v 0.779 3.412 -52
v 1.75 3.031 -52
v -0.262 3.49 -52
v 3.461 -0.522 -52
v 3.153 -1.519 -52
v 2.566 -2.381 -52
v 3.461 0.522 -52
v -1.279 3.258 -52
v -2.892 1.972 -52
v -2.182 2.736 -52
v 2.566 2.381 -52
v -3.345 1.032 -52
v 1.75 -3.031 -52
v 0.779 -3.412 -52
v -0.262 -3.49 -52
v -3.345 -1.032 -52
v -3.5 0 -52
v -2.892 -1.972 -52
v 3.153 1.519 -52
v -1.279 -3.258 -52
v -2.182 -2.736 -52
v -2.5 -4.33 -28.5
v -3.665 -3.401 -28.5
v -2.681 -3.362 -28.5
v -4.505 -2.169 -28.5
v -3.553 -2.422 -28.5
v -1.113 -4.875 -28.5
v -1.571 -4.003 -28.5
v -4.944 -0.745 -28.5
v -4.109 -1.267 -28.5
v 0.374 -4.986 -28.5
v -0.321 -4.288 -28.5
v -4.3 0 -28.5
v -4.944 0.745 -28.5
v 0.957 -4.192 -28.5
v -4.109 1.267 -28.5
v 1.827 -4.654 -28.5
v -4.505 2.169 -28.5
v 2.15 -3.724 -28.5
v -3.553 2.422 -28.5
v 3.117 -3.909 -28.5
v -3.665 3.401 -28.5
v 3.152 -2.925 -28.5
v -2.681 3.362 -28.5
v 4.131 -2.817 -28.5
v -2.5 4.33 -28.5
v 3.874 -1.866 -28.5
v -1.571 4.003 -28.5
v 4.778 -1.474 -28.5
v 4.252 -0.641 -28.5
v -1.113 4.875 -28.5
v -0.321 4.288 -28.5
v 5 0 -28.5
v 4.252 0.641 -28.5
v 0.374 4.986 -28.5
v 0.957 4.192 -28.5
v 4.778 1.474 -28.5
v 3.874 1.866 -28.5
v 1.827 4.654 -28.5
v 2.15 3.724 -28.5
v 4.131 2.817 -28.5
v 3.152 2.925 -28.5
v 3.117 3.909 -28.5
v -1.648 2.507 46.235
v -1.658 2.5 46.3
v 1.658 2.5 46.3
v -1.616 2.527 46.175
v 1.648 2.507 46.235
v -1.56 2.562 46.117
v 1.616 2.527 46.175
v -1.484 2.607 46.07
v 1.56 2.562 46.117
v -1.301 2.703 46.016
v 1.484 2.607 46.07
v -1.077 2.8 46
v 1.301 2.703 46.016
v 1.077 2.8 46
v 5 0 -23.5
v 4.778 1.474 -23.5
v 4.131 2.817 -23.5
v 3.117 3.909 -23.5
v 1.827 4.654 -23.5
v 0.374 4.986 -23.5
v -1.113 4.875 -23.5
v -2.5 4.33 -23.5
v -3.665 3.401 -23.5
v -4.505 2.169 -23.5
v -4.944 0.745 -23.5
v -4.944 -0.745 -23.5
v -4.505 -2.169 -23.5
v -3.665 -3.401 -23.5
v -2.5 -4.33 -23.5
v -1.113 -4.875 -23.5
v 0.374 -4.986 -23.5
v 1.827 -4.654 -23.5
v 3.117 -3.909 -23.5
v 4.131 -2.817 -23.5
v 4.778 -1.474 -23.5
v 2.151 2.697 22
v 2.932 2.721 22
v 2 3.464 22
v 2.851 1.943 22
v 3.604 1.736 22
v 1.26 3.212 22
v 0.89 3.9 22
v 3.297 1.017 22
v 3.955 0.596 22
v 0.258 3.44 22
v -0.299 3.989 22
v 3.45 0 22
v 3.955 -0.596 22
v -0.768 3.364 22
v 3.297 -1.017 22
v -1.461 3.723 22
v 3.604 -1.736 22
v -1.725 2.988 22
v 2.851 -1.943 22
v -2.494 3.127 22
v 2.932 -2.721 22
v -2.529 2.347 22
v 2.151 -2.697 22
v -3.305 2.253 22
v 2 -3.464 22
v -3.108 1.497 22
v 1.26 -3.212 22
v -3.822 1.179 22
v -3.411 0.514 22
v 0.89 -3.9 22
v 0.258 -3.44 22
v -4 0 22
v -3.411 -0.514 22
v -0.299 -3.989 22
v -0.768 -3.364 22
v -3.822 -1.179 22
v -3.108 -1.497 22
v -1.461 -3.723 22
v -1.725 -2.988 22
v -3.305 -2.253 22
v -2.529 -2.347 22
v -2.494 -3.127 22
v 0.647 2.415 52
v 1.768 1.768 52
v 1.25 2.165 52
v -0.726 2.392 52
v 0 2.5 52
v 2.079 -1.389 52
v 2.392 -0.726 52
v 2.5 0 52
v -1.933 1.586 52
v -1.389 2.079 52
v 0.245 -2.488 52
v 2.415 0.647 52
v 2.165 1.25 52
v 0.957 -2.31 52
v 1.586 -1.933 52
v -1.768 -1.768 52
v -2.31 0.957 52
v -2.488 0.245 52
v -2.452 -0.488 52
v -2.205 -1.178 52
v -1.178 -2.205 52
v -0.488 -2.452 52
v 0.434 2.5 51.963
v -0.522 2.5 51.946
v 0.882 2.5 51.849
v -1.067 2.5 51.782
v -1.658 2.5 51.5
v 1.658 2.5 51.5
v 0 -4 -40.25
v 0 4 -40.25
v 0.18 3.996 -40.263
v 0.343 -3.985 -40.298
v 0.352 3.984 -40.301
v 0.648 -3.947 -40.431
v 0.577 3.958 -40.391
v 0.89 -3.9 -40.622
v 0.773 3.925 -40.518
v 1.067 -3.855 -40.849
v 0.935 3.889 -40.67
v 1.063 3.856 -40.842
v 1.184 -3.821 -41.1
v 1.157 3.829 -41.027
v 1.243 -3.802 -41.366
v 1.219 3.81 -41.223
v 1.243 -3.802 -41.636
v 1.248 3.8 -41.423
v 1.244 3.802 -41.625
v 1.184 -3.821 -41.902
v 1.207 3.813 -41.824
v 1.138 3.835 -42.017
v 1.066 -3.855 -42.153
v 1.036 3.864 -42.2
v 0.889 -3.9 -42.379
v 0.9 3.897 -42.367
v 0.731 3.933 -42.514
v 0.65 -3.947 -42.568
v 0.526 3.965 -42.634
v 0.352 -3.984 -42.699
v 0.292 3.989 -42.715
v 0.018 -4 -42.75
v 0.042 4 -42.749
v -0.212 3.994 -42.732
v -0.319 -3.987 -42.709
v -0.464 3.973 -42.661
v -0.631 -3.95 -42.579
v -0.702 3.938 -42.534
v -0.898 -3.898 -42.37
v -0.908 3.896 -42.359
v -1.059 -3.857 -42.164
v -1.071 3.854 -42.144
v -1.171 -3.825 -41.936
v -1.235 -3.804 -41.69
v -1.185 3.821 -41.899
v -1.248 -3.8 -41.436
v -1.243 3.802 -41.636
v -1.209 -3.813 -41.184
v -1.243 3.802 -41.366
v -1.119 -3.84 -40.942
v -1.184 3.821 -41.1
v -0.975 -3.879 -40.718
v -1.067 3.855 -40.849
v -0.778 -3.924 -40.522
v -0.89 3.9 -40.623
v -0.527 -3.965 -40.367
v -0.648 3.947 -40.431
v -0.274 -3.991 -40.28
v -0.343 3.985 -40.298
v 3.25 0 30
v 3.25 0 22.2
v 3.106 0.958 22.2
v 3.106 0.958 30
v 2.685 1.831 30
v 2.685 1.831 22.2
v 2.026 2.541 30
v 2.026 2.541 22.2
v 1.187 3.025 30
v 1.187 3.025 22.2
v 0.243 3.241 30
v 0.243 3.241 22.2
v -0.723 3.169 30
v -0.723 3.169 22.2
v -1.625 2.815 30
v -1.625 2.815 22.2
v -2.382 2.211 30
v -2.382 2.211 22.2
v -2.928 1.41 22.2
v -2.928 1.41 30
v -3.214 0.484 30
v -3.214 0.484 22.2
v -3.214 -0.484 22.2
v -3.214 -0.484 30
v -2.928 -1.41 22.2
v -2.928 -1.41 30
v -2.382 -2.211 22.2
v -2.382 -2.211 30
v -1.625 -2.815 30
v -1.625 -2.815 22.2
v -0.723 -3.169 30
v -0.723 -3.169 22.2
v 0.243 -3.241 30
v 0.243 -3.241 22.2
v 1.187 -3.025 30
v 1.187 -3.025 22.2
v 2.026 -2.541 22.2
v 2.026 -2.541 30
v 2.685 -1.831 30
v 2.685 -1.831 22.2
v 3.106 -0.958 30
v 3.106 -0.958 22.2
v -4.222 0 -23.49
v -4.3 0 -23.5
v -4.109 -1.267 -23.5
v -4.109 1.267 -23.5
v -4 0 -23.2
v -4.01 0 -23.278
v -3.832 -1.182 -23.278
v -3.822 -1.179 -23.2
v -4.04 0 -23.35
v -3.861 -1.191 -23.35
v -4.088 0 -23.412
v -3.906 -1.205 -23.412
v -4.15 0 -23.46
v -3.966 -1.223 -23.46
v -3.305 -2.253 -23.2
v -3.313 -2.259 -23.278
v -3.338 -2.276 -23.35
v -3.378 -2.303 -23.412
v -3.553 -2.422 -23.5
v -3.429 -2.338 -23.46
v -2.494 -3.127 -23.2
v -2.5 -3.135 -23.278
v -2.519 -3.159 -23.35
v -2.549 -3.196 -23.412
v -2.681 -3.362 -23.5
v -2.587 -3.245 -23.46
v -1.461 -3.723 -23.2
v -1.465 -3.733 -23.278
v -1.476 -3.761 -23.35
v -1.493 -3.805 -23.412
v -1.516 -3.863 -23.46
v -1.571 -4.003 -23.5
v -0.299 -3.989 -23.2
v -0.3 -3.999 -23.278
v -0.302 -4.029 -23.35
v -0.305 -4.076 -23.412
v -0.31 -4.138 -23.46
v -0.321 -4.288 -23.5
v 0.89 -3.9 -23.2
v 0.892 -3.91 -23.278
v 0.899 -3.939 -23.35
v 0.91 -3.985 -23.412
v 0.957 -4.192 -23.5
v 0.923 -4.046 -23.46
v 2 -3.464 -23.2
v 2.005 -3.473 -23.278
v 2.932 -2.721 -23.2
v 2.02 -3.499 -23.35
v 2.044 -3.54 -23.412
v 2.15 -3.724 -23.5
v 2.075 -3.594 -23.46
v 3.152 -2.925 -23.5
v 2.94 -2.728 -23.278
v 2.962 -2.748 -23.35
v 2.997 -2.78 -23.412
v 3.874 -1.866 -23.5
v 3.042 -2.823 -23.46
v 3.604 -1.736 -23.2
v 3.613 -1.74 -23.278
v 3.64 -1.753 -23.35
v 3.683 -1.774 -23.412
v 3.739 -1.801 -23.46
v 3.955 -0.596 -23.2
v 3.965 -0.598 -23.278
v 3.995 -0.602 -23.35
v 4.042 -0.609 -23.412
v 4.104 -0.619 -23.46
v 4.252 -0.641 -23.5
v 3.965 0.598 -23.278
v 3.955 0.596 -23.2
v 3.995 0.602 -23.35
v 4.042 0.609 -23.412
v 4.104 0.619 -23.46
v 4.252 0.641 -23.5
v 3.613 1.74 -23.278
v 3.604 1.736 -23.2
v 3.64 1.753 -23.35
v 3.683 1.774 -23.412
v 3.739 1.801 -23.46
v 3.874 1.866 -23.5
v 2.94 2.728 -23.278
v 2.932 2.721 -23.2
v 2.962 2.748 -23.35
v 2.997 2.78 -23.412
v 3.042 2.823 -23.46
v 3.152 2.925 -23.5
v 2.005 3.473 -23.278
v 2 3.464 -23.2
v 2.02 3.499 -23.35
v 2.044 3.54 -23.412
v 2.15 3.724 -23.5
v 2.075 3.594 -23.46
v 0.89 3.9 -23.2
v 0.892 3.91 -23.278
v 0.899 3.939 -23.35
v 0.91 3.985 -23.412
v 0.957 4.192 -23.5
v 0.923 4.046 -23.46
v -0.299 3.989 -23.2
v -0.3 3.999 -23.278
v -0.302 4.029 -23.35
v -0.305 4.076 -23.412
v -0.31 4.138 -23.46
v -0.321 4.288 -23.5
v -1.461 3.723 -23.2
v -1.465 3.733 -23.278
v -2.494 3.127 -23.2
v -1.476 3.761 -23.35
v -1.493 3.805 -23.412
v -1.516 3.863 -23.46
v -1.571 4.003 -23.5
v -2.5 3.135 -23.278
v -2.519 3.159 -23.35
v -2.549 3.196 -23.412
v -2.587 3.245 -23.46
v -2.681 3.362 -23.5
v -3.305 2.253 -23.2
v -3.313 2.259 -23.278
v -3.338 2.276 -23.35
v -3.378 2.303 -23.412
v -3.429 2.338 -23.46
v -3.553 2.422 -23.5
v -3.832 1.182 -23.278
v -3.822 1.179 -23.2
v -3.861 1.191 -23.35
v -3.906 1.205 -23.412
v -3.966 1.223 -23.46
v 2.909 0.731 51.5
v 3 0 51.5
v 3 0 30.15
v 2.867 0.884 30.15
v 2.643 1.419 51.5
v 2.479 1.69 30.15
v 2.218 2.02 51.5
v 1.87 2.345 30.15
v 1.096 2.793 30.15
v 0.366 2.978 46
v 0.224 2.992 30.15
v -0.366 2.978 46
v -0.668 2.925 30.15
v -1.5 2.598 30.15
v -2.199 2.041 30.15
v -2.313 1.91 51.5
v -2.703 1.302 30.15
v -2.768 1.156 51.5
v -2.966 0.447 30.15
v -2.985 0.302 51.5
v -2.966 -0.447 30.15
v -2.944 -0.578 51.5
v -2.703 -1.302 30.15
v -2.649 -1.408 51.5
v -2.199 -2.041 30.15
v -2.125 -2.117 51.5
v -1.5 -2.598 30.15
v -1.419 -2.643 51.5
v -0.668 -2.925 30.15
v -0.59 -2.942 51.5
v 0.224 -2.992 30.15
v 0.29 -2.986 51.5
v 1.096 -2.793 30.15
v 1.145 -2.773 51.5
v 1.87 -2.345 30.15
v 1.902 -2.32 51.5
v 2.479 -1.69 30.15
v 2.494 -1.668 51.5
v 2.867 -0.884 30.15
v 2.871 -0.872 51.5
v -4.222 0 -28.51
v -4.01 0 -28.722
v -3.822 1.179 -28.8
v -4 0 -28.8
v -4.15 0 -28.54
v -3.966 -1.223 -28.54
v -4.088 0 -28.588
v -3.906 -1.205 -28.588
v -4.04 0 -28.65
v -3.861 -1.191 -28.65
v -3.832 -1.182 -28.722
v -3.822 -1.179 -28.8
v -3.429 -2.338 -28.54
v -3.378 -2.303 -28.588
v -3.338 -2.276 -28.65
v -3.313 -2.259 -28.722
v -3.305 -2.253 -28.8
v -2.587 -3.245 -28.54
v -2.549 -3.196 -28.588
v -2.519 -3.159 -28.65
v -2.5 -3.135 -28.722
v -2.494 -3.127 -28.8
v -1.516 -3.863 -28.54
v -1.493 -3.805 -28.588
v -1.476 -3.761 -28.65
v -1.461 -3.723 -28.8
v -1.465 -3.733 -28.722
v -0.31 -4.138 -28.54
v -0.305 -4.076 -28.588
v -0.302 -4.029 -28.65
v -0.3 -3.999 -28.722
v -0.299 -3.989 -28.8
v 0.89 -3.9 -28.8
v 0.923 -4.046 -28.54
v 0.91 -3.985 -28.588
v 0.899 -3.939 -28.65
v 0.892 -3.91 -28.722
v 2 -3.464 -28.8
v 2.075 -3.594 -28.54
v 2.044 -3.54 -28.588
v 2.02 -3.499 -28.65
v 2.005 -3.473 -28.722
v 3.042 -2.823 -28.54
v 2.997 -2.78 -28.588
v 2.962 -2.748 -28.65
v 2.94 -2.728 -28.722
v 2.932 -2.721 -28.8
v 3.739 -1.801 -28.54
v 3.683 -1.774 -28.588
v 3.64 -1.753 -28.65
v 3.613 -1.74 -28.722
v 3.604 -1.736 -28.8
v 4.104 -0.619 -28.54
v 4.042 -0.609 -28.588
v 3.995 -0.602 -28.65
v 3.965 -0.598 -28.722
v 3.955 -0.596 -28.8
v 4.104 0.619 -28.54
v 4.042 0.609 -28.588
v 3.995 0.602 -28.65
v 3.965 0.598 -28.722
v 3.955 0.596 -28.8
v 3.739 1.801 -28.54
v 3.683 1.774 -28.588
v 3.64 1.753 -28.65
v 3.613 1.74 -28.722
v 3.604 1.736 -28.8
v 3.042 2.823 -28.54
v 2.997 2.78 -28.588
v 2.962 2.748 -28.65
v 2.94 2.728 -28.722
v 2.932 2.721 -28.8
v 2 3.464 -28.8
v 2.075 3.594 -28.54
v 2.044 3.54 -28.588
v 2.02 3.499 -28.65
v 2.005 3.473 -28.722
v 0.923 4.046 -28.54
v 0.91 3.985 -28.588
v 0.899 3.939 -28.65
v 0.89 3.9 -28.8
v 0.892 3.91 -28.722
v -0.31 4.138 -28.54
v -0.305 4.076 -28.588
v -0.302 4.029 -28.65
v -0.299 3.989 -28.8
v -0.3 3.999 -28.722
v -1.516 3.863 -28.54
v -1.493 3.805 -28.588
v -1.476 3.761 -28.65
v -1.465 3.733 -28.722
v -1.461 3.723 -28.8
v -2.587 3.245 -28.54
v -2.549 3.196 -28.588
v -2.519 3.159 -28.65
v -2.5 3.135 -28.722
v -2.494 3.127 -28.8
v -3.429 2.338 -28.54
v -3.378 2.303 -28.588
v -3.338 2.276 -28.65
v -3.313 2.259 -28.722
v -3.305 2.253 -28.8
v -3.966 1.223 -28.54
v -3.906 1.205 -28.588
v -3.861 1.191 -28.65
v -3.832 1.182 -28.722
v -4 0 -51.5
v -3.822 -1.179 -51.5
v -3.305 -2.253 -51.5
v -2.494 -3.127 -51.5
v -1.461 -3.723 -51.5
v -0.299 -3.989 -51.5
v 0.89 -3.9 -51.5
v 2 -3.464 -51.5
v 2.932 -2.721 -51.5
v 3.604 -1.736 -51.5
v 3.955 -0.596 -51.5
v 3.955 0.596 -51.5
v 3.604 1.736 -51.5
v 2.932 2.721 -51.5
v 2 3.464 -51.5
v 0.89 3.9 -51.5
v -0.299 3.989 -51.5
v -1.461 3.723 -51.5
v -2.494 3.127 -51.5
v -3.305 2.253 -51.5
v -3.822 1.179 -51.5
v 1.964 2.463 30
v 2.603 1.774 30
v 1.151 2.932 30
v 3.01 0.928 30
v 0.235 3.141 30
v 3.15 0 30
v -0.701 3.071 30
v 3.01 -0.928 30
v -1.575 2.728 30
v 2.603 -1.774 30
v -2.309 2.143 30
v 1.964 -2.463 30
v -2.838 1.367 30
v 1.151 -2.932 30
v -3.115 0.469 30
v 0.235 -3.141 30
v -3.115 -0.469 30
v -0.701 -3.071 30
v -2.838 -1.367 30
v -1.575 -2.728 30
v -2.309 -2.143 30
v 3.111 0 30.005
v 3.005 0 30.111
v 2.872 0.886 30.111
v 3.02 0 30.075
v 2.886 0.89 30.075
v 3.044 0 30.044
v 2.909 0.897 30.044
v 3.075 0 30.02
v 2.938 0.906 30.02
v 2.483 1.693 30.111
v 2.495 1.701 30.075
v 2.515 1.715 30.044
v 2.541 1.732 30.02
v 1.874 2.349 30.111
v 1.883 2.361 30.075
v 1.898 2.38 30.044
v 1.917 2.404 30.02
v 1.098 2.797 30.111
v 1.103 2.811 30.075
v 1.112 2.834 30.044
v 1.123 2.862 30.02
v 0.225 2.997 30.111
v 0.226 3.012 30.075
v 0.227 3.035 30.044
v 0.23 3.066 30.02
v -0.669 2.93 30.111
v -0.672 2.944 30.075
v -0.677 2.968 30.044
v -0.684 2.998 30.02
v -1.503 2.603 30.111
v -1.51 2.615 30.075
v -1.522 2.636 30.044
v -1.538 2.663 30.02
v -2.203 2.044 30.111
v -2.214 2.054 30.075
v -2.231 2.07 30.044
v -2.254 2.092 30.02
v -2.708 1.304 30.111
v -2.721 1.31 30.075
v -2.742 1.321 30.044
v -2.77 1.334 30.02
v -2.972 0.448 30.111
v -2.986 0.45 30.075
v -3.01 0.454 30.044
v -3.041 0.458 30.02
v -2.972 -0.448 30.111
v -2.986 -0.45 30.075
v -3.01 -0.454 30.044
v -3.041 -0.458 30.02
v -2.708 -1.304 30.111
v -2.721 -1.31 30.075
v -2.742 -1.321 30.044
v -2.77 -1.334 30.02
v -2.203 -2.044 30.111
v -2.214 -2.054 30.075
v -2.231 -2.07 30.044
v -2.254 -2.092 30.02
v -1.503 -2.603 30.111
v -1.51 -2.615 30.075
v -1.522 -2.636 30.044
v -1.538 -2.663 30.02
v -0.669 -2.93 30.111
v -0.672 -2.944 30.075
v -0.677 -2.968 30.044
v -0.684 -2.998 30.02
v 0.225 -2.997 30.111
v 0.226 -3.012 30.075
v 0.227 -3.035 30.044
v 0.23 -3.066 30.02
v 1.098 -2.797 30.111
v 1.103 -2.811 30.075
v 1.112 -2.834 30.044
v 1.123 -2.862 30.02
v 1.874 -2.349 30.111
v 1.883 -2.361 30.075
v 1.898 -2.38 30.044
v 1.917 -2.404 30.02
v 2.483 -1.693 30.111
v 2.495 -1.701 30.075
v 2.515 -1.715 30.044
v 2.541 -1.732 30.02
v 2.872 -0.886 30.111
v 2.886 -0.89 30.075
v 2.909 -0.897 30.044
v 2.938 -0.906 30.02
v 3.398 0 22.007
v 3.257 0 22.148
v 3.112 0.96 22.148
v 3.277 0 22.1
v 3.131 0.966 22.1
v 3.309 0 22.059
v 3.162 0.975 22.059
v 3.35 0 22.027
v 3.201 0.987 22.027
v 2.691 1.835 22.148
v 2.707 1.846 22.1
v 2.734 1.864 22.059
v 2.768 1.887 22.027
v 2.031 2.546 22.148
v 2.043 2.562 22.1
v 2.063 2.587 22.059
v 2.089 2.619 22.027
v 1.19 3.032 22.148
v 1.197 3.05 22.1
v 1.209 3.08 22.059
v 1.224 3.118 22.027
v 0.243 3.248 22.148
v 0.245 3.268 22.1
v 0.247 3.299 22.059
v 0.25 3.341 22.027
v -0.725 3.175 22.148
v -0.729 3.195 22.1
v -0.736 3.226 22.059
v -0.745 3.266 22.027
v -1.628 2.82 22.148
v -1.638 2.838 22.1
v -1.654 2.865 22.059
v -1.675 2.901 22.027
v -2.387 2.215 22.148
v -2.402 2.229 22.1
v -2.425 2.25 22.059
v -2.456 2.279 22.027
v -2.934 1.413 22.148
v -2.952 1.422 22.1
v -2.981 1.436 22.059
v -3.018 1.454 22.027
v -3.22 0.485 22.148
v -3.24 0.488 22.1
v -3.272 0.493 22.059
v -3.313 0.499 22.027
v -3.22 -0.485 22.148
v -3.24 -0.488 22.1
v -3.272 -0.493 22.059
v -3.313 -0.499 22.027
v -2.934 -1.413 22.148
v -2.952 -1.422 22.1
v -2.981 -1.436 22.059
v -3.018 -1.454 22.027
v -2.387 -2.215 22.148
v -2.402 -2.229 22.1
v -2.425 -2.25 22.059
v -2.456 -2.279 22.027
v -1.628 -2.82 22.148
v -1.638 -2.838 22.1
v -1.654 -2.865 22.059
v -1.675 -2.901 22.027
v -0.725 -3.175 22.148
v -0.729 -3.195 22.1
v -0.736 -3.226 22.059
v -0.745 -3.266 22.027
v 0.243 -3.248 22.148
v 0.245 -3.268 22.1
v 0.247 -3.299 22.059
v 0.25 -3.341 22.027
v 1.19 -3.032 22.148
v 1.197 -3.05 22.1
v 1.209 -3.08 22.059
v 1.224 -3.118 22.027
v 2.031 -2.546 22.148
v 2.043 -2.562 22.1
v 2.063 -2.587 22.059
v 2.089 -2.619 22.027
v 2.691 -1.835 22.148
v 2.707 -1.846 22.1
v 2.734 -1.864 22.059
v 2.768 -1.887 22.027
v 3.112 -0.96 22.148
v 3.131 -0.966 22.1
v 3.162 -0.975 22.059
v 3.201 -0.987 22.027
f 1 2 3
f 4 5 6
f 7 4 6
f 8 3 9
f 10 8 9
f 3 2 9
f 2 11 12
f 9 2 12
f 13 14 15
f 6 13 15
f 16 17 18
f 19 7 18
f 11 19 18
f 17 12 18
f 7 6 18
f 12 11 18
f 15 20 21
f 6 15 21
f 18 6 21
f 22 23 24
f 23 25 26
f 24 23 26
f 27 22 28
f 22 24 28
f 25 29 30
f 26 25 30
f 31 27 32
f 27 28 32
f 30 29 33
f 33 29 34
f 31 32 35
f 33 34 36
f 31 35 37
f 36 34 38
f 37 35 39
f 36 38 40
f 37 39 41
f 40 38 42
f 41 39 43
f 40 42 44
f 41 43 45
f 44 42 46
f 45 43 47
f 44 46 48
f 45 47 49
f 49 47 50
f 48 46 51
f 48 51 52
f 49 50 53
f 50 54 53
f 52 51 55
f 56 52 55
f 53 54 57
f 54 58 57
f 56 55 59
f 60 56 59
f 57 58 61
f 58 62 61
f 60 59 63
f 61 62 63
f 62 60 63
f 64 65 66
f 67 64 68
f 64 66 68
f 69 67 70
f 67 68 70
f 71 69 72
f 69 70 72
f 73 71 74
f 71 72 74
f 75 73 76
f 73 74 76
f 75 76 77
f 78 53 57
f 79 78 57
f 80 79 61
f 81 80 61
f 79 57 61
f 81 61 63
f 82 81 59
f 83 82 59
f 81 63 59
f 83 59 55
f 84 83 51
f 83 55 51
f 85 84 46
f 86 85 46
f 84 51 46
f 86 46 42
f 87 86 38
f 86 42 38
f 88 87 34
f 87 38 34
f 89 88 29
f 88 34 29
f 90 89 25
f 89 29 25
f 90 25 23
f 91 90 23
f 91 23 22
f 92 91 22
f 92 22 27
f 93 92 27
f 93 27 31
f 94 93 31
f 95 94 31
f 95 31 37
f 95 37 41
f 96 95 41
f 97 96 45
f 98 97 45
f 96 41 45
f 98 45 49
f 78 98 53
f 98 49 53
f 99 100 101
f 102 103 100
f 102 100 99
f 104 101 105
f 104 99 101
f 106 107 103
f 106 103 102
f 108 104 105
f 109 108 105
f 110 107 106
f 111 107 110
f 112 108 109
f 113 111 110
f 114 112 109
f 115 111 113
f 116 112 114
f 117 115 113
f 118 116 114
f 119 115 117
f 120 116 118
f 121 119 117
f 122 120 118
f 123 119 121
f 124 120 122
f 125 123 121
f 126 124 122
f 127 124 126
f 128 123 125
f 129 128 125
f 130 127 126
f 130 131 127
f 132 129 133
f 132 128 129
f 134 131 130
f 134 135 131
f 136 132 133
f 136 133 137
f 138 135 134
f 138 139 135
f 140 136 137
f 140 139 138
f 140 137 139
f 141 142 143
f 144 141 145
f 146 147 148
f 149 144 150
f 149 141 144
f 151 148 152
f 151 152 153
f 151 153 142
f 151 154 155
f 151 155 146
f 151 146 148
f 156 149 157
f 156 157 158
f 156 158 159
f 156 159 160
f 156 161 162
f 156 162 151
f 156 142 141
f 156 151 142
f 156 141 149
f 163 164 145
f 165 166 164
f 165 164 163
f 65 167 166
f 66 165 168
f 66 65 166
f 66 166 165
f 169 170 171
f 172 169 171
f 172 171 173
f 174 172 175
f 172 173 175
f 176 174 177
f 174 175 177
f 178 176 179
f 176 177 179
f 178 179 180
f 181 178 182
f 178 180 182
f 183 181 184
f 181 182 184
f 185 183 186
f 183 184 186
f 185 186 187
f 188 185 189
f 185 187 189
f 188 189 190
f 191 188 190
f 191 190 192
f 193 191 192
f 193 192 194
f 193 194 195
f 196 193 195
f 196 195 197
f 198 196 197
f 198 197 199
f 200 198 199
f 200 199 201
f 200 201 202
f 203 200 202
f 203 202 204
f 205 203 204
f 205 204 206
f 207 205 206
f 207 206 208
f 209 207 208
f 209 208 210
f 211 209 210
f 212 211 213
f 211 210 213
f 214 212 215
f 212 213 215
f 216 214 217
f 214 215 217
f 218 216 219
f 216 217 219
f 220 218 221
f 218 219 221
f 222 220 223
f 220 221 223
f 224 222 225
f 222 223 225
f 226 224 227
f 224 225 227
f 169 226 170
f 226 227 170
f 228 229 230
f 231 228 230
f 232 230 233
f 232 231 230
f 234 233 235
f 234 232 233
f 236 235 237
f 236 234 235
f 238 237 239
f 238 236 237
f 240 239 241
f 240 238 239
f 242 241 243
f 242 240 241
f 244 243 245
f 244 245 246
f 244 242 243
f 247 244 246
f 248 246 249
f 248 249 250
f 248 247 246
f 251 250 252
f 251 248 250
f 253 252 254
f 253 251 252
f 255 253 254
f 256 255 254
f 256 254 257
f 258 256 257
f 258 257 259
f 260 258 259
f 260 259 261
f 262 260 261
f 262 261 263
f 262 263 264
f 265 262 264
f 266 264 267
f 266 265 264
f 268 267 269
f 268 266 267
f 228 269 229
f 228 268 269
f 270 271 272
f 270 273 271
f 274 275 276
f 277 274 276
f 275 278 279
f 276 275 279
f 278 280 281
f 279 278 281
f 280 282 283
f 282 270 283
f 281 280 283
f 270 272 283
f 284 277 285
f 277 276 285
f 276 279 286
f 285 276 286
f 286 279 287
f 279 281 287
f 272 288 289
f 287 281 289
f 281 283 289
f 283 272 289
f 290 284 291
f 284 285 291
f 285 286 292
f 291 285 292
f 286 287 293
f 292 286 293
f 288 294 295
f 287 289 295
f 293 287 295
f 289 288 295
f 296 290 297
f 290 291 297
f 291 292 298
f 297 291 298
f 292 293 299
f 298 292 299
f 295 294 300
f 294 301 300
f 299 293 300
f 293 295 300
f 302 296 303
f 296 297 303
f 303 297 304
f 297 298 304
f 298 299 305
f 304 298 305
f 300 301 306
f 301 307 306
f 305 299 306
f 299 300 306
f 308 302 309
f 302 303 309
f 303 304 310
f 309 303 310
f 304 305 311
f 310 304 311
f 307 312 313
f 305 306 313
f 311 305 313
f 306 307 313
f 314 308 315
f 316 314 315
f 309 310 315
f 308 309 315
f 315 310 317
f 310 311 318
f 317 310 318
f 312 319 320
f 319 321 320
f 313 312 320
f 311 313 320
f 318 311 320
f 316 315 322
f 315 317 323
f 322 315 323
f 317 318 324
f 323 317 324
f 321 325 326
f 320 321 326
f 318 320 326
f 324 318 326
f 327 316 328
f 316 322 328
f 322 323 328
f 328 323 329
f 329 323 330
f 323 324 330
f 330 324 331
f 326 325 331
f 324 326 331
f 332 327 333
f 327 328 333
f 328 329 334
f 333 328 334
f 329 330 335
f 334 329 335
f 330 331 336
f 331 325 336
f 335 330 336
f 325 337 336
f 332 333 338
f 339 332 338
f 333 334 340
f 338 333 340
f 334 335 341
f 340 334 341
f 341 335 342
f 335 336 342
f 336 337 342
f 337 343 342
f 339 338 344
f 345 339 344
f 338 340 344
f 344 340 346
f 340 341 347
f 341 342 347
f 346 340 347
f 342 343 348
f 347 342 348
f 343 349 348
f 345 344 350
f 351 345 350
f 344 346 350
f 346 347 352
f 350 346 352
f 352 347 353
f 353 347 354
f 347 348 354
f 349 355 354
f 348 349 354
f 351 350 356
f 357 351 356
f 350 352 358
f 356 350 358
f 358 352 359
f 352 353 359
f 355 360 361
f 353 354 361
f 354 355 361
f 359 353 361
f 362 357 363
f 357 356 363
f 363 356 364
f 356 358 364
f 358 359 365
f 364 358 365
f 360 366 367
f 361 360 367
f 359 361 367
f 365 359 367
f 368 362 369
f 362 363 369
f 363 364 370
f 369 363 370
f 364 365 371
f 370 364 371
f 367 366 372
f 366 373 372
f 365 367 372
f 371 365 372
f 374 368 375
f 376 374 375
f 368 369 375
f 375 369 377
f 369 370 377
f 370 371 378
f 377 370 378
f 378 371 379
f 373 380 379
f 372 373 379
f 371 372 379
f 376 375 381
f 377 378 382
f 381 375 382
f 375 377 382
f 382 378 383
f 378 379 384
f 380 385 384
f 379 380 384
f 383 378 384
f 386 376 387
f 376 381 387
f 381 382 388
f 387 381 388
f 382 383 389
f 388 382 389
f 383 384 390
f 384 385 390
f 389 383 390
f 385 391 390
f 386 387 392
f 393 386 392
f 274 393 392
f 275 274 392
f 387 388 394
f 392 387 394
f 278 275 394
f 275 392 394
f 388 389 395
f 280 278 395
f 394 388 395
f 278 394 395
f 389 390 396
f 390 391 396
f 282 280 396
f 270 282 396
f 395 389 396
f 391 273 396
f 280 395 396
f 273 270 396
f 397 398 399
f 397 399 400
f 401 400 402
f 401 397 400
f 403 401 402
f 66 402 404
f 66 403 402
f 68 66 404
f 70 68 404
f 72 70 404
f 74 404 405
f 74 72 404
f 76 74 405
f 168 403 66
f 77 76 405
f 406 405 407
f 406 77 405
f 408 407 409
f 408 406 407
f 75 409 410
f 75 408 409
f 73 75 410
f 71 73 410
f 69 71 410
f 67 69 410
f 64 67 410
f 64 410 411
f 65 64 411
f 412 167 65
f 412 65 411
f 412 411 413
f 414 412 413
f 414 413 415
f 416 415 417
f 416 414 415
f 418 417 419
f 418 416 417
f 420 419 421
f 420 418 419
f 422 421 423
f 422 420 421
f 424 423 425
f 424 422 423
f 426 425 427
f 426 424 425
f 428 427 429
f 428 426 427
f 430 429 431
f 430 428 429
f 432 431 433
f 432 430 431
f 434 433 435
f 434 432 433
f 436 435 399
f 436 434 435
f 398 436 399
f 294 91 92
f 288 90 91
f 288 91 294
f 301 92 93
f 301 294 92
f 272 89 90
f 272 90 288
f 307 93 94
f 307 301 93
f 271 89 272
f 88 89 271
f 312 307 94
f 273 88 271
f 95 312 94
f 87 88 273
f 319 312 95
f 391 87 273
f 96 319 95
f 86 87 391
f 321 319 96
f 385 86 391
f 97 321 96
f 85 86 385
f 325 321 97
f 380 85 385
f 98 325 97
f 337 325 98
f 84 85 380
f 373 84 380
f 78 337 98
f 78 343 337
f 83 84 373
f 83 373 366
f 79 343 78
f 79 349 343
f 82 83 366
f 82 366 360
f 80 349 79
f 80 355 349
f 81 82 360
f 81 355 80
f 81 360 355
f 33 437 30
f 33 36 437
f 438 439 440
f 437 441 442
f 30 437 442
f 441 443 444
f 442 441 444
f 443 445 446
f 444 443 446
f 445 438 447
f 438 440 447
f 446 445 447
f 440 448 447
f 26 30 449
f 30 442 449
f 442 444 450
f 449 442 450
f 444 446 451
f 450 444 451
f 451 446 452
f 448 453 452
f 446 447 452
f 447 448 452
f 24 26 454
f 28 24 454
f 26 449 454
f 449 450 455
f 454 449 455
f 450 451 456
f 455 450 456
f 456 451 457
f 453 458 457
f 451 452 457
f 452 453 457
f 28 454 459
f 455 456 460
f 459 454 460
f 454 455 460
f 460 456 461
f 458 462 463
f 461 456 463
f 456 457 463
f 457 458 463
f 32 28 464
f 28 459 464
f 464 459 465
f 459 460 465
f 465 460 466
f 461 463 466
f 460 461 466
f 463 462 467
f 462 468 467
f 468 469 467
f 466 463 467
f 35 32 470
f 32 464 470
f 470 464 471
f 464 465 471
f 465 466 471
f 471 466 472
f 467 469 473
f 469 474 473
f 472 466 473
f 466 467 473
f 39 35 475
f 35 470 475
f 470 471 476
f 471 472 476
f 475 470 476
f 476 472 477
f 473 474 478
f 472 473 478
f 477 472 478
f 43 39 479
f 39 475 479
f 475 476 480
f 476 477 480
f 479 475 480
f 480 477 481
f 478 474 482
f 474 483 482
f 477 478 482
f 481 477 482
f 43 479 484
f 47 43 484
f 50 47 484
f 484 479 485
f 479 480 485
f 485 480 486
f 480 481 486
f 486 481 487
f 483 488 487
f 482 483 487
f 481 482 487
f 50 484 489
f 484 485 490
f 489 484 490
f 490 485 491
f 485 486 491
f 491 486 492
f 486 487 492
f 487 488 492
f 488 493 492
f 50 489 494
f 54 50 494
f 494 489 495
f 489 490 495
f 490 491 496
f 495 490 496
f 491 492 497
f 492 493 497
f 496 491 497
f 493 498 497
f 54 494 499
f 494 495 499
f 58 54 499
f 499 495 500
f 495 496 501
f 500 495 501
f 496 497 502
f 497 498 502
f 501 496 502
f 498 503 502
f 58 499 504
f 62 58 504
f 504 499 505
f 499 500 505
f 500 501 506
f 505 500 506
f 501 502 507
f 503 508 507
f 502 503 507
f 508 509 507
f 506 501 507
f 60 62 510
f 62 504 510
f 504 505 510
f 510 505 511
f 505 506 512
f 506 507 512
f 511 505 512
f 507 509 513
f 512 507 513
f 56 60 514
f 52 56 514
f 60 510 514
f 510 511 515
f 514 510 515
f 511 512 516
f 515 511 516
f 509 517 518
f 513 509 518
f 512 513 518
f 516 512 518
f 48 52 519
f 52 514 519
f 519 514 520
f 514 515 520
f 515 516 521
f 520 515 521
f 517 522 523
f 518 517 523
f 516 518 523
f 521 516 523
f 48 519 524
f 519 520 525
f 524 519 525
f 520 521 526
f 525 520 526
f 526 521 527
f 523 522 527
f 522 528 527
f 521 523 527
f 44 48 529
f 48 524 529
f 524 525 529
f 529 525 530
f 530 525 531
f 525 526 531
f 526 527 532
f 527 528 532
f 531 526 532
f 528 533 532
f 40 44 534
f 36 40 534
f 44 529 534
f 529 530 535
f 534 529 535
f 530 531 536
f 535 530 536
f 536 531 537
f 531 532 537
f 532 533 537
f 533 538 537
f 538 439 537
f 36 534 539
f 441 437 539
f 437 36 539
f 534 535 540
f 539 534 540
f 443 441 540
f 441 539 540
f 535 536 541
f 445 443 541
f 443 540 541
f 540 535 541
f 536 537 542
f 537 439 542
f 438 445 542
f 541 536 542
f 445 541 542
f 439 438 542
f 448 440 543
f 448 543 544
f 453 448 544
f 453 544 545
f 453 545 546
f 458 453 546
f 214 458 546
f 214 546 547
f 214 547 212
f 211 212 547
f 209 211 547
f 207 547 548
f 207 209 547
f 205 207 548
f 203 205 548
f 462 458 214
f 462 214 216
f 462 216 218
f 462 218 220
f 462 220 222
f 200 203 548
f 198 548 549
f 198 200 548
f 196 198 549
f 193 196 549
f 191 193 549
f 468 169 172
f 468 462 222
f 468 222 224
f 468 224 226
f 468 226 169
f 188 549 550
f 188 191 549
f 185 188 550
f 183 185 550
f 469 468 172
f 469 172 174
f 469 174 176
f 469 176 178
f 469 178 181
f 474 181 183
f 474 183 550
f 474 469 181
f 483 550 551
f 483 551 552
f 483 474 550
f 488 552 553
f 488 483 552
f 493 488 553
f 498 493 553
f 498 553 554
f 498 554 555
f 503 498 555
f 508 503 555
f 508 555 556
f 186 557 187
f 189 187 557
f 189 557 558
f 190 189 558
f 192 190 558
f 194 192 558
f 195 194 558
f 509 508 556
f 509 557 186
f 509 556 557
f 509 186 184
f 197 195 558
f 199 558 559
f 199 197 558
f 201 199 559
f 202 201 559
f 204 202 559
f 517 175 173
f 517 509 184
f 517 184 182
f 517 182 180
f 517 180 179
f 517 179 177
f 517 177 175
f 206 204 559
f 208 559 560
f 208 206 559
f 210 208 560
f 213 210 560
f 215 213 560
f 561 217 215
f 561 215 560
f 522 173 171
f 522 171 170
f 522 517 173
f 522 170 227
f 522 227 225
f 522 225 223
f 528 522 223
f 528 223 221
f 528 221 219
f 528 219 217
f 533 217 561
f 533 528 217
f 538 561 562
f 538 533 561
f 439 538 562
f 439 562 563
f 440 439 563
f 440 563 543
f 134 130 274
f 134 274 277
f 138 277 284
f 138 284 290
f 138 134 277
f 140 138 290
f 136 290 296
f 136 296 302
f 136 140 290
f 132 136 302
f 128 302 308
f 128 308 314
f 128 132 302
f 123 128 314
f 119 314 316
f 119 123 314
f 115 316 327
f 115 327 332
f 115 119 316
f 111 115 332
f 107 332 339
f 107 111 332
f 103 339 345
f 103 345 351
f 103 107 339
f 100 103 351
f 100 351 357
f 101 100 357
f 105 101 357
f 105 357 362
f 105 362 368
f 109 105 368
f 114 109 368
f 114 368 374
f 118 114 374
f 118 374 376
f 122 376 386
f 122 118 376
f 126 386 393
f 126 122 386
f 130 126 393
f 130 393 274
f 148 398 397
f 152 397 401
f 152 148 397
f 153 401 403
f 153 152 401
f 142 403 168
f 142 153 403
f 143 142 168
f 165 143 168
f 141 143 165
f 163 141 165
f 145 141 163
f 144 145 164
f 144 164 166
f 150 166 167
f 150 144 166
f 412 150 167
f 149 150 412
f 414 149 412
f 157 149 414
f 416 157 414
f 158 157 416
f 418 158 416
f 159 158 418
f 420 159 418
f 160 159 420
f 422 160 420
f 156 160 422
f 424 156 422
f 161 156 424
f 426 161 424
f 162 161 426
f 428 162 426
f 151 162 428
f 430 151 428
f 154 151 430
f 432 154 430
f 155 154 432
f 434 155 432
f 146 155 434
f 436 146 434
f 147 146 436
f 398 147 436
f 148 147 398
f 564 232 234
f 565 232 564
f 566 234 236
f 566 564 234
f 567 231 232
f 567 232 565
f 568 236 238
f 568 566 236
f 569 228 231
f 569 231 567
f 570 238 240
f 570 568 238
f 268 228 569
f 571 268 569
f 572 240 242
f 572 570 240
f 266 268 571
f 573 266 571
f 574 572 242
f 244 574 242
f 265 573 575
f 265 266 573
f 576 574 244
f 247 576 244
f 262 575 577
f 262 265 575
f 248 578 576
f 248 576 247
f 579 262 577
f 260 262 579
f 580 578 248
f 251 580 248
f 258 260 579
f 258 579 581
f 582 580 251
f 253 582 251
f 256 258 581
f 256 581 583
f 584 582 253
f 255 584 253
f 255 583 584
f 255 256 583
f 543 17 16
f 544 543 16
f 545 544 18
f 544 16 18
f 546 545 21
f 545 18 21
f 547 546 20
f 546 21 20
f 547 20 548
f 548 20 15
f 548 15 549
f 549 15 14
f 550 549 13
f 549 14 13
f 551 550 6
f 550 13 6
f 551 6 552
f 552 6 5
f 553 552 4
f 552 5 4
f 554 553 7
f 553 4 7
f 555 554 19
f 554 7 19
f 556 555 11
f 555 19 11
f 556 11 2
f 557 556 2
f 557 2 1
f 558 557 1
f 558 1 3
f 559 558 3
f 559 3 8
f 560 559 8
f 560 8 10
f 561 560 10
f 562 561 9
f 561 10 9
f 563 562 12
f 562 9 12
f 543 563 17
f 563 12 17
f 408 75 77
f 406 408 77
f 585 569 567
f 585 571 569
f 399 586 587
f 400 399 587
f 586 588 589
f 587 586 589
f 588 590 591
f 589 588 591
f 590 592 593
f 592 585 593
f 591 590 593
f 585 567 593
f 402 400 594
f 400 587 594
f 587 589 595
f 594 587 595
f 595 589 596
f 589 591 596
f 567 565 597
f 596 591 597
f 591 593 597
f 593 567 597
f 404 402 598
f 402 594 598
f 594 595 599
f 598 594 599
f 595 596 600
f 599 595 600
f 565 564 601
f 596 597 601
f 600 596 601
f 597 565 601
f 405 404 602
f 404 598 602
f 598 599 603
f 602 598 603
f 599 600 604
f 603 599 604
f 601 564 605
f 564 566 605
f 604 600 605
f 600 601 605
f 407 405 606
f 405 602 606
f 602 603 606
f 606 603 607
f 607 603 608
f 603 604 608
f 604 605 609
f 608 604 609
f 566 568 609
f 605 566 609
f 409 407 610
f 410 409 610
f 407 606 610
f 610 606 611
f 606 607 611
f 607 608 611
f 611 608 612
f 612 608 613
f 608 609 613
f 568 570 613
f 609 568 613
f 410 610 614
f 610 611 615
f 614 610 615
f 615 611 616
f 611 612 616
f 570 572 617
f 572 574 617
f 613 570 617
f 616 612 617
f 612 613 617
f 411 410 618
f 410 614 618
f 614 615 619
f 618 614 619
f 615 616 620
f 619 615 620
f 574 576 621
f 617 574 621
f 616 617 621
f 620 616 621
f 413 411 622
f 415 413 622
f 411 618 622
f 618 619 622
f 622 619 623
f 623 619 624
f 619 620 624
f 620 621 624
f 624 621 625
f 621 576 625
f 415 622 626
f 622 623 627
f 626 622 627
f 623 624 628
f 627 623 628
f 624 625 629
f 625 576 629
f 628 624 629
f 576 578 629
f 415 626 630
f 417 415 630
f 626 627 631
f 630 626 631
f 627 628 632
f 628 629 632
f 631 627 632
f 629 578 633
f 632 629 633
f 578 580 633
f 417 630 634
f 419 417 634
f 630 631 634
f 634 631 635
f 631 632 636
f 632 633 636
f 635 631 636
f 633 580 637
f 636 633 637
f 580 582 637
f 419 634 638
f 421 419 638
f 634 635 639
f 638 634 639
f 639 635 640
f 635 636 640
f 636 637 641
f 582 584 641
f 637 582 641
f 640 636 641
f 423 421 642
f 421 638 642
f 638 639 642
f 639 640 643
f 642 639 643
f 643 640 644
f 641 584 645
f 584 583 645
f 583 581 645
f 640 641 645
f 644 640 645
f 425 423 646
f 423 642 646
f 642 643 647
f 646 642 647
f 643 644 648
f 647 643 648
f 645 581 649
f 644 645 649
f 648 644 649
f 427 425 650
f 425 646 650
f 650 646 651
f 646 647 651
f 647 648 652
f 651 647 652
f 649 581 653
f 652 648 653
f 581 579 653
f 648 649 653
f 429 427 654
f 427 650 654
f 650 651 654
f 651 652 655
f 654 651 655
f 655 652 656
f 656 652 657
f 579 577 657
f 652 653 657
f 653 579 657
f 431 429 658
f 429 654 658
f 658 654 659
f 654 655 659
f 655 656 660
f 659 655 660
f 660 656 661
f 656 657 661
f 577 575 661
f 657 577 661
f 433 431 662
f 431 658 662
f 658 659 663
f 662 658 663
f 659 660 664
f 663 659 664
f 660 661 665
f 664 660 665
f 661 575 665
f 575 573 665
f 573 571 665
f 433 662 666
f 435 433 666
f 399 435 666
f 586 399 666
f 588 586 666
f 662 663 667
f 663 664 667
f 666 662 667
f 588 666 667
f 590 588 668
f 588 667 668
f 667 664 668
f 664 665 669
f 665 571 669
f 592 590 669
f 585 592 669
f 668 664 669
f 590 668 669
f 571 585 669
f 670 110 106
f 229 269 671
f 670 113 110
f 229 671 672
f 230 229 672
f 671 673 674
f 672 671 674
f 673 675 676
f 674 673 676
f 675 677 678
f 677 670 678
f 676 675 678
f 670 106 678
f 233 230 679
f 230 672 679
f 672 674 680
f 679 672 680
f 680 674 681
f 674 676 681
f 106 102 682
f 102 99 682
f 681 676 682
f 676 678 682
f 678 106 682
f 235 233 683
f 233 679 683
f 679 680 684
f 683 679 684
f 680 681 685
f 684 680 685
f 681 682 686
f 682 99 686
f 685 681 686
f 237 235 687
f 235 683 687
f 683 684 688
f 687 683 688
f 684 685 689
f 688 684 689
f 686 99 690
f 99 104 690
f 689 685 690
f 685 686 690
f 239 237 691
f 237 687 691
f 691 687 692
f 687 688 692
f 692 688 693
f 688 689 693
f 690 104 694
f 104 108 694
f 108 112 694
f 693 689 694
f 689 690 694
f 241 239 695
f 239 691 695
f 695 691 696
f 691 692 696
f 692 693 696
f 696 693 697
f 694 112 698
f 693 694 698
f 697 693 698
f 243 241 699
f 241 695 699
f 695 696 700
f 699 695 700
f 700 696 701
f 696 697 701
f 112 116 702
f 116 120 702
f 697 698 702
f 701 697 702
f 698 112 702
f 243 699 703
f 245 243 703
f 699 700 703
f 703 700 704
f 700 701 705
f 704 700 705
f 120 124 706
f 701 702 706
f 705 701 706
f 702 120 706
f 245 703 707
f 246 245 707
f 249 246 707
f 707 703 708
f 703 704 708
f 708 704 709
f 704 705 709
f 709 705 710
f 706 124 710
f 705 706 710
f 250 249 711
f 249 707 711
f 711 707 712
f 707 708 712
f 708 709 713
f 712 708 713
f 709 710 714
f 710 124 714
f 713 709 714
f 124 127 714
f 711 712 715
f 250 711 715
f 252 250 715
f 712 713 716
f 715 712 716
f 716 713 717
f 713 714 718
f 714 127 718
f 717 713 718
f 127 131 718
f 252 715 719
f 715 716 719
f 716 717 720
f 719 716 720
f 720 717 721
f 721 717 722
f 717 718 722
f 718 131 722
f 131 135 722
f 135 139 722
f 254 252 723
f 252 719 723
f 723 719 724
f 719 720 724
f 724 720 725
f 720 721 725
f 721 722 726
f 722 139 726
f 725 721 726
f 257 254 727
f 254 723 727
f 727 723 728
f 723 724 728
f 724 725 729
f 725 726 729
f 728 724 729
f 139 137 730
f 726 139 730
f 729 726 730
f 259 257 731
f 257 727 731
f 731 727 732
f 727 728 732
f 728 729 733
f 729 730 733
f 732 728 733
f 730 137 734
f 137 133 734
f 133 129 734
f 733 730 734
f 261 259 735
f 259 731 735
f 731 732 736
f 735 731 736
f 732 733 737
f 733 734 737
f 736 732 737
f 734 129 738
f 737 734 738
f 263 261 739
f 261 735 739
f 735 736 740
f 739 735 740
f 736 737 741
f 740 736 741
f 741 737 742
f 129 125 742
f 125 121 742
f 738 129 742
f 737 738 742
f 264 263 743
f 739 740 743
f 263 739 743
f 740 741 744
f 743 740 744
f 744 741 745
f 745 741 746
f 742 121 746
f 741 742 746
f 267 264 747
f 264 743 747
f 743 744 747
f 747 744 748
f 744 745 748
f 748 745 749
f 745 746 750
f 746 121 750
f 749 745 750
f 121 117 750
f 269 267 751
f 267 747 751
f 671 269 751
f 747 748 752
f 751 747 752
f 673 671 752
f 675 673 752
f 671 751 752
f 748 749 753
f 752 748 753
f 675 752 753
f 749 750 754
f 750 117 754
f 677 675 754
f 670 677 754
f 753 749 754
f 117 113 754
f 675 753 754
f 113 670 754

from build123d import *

# Parameters (mm, degrees)
CROQUIS1_R              = 4
SALIENTE_EXTRUIR1_DEPTH = 52
CROQUIS2_R              = 5
SALIENTE_EXTRUIR2_DEPTH = 5
CROQUIS3_R              = 4
CROQUIS3_R_2            = 3
CORTAR_EXTRUIR1_DEPTH   = 22
CROQUIS5_R              = 1.25
CORTAR_EXTRUIR2_DEPTH   = 54.009433123
CHAFL_N1_SIZE           = 0.5
CROQUIS6_W              = 6
CROQUIS6_H              = 6
CORTAR_EXTRUIR3_DEPTH   = 53.775467786
CROQUIS7_R              = 4
CROQUIS7_R_2            = 3.25
CORTAR_EXTRUIR4_DEPTH   = 8
REDONDEO2_R             = 0.15
REDONDEO3_R             = 0.2
REDONDEO1_R             = 0.3
REDONDEO4_R             = 0.3
REDONDEO5_R             = 0.3


with BuildPart() as part:
    # Croquis1 → Saliente-Extruir1 (new, symmetric)
    with BuildSketch(Plane.XY):
        with Locations(Location((0, 0, 0), (0, 0, 180))):
            Circle(CROQUIS1_R)
    extrude(amount=SALIENTE_EXTRUIR1_DEPTH, both=True)

    # Croquis2 → Saliente-Extruir2 (add)
    with BuildSketch(Plane.XY.offset(-28.5)):
        Circle(CROQUIS2_R)
    extrude(amount=SALIENTE_EXTRUIR2_DEPTH)

    # Croquis3 → Cortar-Extruir1 (cut)
    with BuildSketch(Plane.XY.offset(52)):
        with Locations(Location((0, 0, 0), (0, 0, 180))):
            Circle(CROQUIS3_R)
        Circle(CROQUIS3_R_2, mode=Mode.SUBTRACT)
    extrude(amount=-CORTAR_EXTRUIR1_DEPTH, mode=Mode.SUBTRACT)

    # Croquis5 → Cortar-Extruir2 (cut, through all)
    with BuildSketch(Plane(origin=(0, 4, 0), x_dir=(1, 0, 0), z_dir=(0, 1, 0))):
        with Locations(Location((0, 41.5, 0), (0, 0, 270))):
            Circle(CROQUIS5_R)
    extrude(amount=-CORTAR_EXTRUIR2_DEPTH, mode=Mode.SUBTRACT)

    # Chaflán1
    chafl_n1_edges = [part.edges().sort_by_distance(p)[0] for p in [
        (-3, 0, 52),
        (4, 0, -52),
    ]]
    chamfer(chafl_n1_edges, length=CHAFL_N1_SIZE)

    # Croquis6 → Cortar-Extruir3 (cut, through all)
    with BuildSketch(Plane(origin=(0, 2.5, 0), x_dir=(1, 0, 0), z_dir=(0, 1, 0))):
        with Locations((0, -49)):
            Rectangle(CROQUIS6_W, CROQUIS6_H)
    extrude(amount=CORTAR_EXTRUIR3_DEPTH, mode=Mode.SUBTRACT)

    # Croquis7 → Cortar-Extruir4 (cut)
    with BuildSketch(Plane.XY.offset(30)):
        with Locations(Location((0, 0, 0), (0, 0, 180))):
            Circle(CROQUIS7_R)
        Circle(CROQUIS7_R_2, mode=Mode.SUBTRACT)
    extrude(amount=-CORTAR_EXTRUIR4_DEPTH, mode=Mode.SUBTRACT)

    # Redondeo2
    redondeo2_edges = [part.edges().sort_by_distance(p)[0] for p in [
        (-3, 0, 30),
    ]]
    fillet(redondeo2_edges, radius=REDONDEO2_R)

    # Redondeo3
    redondeo3_edges = [part.edges().sort_by_distance(p)[0] for p in [
        (-3.25, 0, 22),
    ]]
    fillet(redondeo3_edges, radius=REDONDEO3_R)

    # Redondeo1
    redondeo1_edges = [part.edges().sort_by_distance(p)[0] for p in [
        (4, 0, -23.5),
    ]]
    fillet(redondeo1_edges, radius=REDONDEO1_R)

    # Redondeo4
    redondeo4_edges = [part.edges().sort_by_distance(p)[0] for p in [
        (4, 0, -28.5),
    ]]
    fillet(redondeo4_edges, radius=REDONDEO4_R)

    # Redondeo5
    redondeo5_edges = [part.edges().sort_by_distance(p)[0] for p in [
        (0, 2.5, 46),
    ]]
    fillet(redondeo5_edges, radius=REDONDEO5_R)


solid = part.part
